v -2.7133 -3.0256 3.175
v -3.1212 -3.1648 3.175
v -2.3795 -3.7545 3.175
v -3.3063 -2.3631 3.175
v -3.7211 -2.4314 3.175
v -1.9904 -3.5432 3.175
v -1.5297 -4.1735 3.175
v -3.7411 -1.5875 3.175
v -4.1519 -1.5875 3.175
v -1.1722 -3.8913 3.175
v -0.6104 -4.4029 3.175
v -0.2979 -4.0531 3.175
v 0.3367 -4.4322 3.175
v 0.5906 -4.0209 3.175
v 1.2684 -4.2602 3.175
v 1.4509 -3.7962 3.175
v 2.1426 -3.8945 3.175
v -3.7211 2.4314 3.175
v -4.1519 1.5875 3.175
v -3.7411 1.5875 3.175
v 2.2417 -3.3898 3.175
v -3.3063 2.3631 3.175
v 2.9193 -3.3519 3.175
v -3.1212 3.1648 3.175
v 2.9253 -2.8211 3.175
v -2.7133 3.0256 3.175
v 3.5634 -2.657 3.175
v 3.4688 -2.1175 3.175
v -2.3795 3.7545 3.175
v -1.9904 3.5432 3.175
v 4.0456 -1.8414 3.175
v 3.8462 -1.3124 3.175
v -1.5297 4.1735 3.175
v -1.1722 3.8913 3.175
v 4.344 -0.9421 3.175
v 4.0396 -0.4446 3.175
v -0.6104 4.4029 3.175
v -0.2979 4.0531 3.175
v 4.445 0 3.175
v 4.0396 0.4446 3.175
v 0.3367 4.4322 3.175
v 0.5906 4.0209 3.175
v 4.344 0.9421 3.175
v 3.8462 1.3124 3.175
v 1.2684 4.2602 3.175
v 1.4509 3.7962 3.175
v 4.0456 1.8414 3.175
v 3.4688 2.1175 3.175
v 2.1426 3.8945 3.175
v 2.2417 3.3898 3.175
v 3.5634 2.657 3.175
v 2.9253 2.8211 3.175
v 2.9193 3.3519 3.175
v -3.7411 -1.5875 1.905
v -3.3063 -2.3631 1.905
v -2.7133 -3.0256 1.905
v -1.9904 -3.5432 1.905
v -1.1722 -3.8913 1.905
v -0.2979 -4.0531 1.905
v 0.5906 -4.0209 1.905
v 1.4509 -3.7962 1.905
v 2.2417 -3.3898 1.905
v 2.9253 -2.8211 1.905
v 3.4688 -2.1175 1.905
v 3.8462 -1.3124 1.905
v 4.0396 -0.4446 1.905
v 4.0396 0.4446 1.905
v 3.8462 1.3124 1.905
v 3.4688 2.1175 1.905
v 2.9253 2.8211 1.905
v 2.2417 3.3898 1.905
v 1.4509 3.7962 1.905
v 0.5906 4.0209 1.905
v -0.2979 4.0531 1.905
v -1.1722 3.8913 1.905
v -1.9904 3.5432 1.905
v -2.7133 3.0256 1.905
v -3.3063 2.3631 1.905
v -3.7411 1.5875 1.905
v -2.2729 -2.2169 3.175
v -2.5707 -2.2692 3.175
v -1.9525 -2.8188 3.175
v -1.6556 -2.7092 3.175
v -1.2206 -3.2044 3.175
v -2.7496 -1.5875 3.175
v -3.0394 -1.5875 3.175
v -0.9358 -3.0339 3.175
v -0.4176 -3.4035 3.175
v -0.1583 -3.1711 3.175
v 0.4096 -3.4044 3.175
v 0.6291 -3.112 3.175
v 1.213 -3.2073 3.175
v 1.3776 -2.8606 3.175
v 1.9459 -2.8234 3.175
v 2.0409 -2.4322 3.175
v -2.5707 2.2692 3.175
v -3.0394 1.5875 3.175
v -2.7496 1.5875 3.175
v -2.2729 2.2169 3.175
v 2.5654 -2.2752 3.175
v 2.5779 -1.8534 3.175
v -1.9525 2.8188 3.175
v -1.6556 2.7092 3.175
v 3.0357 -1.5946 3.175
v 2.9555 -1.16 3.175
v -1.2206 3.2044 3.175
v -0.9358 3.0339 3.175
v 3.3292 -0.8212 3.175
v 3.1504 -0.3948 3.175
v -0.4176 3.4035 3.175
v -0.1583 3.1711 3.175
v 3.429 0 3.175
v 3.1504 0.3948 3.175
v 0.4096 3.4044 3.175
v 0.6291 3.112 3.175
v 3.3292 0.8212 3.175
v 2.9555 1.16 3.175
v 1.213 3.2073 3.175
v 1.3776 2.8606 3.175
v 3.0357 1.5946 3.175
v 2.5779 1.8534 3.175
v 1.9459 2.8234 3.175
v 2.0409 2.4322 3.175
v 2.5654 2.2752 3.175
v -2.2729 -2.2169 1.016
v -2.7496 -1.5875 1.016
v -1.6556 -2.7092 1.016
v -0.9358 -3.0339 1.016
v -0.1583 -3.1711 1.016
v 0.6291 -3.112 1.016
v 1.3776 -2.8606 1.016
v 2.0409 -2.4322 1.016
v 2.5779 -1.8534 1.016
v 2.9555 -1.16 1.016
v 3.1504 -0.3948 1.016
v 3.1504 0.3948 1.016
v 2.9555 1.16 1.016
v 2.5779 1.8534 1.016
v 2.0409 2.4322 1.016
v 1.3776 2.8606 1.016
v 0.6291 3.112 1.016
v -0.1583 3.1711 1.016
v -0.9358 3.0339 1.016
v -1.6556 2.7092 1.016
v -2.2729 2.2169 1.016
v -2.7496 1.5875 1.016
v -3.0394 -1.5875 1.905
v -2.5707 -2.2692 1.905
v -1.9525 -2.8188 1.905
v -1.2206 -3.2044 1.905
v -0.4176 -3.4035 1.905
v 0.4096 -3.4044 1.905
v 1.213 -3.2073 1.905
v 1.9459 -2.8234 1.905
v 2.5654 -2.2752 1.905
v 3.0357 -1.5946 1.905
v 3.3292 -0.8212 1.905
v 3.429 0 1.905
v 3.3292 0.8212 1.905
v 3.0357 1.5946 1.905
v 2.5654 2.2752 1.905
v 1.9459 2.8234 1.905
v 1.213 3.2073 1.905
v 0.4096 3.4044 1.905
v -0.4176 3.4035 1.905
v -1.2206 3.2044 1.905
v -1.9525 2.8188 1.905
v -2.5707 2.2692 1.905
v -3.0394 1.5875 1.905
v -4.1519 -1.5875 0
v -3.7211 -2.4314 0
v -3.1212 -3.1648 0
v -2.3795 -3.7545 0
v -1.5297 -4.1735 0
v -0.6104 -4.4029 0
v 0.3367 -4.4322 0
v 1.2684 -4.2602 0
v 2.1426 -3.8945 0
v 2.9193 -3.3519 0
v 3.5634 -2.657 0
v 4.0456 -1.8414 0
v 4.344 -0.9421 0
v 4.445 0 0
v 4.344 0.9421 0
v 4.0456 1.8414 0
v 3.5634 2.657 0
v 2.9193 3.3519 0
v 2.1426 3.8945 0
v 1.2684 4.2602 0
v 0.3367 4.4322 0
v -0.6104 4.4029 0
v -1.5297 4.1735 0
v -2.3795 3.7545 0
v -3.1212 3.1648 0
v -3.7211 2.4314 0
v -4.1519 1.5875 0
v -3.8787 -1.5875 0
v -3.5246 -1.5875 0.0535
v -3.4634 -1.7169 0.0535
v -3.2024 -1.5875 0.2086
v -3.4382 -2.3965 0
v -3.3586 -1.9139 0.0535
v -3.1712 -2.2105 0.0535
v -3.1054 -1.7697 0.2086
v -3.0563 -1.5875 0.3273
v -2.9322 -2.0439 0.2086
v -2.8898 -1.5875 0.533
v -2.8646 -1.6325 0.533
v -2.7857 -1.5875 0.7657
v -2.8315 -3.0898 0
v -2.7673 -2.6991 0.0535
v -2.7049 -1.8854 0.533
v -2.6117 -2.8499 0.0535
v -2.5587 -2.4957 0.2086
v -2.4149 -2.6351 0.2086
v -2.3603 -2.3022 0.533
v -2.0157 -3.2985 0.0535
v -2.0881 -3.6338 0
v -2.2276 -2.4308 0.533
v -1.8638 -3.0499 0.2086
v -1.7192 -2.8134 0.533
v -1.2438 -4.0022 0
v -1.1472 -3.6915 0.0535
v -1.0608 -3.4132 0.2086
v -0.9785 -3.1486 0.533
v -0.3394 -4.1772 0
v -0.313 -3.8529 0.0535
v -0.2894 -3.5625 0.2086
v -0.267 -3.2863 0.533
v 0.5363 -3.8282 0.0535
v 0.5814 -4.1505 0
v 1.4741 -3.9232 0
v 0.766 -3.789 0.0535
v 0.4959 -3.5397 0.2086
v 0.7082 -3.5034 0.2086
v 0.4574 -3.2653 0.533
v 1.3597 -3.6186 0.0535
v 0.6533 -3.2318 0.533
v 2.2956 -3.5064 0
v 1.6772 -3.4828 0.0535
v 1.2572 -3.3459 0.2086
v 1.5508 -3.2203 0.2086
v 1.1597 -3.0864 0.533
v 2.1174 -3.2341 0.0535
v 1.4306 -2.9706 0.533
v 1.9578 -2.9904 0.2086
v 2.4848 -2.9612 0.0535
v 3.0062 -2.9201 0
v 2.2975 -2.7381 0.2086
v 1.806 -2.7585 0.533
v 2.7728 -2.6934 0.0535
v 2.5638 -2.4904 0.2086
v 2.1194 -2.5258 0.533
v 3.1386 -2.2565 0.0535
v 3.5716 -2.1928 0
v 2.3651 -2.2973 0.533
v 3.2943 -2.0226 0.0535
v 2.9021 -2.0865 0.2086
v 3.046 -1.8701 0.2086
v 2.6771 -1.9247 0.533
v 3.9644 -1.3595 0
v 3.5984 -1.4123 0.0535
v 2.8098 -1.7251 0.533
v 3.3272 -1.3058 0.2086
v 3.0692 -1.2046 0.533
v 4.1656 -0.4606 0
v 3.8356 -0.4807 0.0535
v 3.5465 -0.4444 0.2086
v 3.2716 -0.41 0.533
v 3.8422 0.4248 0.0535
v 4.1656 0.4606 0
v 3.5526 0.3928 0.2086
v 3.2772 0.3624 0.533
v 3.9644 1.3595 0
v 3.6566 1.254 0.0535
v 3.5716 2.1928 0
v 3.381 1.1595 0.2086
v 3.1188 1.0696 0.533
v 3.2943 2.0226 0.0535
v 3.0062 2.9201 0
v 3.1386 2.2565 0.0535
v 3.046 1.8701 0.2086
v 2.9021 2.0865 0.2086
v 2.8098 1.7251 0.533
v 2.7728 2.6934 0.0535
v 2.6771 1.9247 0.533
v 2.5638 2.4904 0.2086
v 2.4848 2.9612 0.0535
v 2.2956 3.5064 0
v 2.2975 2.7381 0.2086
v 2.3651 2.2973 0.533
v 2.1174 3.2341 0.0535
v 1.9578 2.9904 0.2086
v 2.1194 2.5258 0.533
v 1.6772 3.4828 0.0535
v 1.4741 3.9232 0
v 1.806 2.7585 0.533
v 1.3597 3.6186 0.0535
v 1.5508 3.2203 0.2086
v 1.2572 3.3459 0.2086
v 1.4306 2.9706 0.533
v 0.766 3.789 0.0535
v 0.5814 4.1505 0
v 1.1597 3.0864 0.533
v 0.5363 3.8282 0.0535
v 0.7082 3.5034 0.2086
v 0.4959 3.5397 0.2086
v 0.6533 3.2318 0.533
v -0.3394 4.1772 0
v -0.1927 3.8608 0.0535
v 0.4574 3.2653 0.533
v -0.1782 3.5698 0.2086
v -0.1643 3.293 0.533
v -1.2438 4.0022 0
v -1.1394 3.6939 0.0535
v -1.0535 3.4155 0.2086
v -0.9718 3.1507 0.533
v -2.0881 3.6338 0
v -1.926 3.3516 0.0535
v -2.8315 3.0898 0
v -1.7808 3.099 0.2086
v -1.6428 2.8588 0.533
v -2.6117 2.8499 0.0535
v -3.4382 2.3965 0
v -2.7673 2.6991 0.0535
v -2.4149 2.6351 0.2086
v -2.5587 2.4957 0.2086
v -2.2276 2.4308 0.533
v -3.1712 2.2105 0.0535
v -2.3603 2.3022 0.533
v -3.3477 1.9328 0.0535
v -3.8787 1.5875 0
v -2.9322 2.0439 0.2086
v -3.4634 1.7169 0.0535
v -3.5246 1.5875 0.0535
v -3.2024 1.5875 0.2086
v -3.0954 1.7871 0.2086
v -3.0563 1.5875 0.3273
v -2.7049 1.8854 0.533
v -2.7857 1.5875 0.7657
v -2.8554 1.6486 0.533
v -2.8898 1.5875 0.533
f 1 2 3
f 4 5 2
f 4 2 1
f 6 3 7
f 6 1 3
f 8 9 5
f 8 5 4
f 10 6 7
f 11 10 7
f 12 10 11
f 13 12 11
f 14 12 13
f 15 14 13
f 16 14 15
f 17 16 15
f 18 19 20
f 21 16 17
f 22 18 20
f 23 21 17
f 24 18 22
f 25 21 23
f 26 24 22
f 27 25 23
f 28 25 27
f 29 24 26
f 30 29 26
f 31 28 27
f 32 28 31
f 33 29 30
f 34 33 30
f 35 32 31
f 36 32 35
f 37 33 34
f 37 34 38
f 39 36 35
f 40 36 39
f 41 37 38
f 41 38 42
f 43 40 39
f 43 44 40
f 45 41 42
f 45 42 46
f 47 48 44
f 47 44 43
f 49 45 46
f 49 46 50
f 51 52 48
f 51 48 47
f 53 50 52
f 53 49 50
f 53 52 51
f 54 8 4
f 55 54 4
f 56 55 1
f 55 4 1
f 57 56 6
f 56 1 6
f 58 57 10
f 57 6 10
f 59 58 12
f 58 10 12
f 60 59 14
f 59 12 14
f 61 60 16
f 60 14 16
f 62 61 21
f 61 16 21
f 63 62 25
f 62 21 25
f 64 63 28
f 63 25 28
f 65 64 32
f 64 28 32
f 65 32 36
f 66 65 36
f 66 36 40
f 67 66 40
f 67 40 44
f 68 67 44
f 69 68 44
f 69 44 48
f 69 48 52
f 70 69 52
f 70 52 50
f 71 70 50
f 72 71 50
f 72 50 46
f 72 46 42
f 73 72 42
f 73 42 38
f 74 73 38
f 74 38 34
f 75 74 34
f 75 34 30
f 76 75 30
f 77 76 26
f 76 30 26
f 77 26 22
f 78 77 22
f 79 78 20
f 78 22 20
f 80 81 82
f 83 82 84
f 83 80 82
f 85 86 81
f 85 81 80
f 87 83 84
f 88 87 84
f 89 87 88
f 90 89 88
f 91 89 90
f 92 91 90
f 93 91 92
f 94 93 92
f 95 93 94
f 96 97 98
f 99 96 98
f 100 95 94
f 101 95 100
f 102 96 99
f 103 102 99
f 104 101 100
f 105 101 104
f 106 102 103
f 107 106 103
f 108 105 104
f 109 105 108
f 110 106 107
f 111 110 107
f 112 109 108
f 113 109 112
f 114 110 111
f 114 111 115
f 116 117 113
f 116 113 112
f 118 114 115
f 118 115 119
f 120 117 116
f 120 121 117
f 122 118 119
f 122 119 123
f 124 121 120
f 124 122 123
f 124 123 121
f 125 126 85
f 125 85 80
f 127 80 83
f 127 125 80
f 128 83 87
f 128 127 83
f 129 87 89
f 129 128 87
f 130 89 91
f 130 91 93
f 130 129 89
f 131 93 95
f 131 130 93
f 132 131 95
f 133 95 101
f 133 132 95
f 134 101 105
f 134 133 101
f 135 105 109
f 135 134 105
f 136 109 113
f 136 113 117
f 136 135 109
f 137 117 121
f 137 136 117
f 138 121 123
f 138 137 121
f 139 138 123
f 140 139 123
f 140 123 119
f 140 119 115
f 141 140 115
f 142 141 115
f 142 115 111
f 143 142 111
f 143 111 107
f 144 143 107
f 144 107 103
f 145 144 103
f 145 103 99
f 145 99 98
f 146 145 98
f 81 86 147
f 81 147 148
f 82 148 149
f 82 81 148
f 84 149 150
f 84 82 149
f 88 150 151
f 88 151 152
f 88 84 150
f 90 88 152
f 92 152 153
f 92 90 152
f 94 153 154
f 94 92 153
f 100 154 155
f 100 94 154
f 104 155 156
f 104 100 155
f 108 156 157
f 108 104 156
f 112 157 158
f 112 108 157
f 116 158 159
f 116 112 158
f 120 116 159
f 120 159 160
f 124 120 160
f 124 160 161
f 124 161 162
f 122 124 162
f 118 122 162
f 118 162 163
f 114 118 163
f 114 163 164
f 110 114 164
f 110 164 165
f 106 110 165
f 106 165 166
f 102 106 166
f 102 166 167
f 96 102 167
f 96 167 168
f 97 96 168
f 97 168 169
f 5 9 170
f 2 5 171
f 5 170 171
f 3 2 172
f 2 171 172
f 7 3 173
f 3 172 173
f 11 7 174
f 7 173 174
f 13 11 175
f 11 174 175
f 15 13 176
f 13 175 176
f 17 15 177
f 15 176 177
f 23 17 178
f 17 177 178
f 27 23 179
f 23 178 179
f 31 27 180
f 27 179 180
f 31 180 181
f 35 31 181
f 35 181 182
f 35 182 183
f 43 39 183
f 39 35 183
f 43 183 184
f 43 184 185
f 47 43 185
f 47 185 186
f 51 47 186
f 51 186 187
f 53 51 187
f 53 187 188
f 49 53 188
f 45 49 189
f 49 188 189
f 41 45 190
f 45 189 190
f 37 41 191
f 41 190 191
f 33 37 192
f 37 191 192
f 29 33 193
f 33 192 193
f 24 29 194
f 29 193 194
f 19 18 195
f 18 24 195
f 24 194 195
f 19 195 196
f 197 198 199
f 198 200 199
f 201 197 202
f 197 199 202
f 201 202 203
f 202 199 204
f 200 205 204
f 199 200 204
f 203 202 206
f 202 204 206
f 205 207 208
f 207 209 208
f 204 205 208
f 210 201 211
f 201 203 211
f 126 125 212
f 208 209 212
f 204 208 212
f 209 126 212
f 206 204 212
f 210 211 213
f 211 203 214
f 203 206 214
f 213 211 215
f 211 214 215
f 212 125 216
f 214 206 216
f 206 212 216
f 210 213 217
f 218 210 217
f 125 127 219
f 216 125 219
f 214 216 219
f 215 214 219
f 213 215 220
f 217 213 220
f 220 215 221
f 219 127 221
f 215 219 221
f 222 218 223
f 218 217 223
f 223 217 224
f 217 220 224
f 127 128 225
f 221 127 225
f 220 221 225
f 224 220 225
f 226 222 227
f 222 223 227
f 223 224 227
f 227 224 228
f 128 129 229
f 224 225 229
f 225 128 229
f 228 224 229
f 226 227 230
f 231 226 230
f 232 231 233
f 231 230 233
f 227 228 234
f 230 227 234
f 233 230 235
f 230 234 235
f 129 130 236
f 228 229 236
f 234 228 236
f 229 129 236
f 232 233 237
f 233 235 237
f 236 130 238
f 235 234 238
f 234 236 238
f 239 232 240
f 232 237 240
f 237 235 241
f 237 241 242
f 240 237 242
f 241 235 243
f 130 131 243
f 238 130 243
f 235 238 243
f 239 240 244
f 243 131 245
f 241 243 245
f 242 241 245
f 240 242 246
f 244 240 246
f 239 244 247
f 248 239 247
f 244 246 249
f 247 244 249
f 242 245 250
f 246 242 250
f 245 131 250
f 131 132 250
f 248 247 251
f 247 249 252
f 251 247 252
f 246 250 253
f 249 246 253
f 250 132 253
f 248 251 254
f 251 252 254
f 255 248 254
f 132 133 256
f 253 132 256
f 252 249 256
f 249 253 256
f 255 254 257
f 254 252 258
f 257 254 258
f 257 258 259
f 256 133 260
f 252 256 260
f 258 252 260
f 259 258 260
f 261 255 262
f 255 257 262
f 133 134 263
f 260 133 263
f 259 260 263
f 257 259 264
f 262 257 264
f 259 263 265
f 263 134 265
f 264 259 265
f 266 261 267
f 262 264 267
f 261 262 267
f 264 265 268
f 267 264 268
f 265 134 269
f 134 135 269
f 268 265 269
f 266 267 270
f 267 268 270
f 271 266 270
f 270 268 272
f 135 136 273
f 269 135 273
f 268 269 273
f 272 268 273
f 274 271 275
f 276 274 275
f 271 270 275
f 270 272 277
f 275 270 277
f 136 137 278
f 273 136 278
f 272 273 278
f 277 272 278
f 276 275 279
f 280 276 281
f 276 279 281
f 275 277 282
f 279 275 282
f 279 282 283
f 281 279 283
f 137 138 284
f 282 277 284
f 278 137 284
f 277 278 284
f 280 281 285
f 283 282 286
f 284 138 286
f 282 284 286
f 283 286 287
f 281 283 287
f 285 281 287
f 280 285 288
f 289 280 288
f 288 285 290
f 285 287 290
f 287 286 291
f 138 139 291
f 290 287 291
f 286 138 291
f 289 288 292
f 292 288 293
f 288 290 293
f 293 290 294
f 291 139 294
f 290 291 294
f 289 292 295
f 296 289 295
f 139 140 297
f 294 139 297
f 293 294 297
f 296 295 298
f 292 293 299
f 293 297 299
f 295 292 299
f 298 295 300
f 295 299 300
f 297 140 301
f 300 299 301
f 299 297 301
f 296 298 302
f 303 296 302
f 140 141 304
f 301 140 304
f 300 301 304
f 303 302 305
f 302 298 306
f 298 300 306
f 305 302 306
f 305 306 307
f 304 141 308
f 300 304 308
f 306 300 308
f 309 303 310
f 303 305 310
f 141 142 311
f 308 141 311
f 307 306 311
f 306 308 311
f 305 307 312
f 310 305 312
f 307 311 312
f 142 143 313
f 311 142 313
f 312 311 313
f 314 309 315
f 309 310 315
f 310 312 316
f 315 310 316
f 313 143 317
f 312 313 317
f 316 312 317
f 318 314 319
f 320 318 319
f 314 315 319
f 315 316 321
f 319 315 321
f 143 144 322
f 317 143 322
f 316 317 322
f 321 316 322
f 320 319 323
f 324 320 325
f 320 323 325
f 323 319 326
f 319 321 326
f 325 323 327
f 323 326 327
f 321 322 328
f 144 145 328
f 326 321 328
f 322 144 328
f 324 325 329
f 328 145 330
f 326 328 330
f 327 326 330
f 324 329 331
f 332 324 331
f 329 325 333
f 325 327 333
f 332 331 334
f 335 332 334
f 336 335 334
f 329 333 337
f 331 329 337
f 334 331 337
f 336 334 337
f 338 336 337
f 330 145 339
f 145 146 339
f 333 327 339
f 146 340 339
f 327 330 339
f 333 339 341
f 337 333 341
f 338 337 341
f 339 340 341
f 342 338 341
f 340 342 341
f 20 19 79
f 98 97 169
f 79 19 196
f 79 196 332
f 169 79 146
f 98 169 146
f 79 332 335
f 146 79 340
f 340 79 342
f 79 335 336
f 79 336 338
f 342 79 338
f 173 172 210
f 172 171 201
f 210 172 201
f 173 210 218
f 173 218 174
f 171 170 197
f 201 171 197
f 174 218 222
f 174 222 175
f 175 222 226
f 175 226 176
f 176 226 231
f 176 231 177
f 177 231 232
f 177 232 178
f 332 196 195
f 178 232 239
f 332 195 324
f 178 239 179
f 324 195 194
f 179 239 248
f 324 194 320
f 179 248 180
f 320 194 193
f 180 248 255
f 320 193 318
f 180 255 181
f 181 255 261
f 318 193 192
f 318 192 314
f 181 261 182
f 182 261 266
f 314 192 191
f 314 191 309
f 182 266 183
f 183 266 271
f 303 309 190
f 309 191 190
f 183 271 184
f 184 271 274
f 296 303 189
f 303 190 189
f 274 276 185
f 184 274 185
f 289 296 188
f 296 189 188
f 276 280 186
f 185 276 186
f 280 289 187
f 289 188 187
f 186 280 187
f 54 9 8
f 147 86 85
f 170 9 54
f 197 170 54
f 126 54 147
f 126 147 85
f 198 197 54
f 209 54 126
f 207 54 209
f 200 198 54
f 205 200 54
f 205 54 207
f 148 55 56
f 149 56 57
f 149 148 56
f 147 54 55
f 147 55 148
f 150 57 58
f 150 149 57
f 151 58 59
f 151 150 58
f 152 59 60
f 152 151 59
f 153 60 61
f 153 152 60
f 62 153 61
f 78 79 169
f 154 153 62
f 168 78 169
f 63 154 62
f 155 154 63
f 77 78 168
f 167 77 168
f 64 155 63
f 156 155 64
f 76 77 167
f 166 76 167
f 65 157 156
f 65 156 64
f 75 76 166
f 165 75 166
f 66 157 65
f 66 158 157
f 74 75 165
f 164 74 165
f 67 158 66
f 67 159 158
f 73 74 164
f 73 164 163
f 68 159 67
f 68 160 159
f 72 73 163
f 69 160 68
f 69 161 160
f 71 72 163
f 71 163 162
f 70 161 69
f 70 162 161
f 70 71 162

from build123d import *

# Parameters (mm, degrees)
F0_R     = 4.445
F0_R_2   = 3.175
F1_DEPTH = 3.175
F2_R     = 4.064
F2_R_2   = 3.429
F3_DEPTH = 1.27
F4_R     = 1.016
F5_W     = 6.35
F5_H     = 3.175
F6_DEPTH = 25.4


with BuildPart() as f1:
    # F0 (on Top) → F1 (new body)
    with BuildSketch(Plane.XY):
        Circle(F0_R)
        Circle(F0_R_2, mode=Mode.SUBTRACT)
    extrude(amount=F1_DEPTH)

    # F2 (on face) → F3 (cut)
    with BuildSketch(Plane.XY.offset(3.175)):
        Circle(F2_R)
        Circle(F2_R_2, mode=Mode.SUBTRACT)
    extrude(amount=-F3_DEPTH, mode=Mode.SUBTRACT)

    # F4
    f4_edges = [f1.edges().sort_by_distance(p)[0] for p in [
        (-3.175, 0, 0),
    ]]
    fillet(f4_edges, radius=F4_R)

    # F5 (on Top) → F6 (cut)
    with BuildSketch(Plane.XY):
        with Locations((-3.175, 0)):
            Rectangle(F5_W, F5_H)
    extrude(amount=F6_DEPTH, mode=Mode.SUBTRACT)


solid = f1.part
